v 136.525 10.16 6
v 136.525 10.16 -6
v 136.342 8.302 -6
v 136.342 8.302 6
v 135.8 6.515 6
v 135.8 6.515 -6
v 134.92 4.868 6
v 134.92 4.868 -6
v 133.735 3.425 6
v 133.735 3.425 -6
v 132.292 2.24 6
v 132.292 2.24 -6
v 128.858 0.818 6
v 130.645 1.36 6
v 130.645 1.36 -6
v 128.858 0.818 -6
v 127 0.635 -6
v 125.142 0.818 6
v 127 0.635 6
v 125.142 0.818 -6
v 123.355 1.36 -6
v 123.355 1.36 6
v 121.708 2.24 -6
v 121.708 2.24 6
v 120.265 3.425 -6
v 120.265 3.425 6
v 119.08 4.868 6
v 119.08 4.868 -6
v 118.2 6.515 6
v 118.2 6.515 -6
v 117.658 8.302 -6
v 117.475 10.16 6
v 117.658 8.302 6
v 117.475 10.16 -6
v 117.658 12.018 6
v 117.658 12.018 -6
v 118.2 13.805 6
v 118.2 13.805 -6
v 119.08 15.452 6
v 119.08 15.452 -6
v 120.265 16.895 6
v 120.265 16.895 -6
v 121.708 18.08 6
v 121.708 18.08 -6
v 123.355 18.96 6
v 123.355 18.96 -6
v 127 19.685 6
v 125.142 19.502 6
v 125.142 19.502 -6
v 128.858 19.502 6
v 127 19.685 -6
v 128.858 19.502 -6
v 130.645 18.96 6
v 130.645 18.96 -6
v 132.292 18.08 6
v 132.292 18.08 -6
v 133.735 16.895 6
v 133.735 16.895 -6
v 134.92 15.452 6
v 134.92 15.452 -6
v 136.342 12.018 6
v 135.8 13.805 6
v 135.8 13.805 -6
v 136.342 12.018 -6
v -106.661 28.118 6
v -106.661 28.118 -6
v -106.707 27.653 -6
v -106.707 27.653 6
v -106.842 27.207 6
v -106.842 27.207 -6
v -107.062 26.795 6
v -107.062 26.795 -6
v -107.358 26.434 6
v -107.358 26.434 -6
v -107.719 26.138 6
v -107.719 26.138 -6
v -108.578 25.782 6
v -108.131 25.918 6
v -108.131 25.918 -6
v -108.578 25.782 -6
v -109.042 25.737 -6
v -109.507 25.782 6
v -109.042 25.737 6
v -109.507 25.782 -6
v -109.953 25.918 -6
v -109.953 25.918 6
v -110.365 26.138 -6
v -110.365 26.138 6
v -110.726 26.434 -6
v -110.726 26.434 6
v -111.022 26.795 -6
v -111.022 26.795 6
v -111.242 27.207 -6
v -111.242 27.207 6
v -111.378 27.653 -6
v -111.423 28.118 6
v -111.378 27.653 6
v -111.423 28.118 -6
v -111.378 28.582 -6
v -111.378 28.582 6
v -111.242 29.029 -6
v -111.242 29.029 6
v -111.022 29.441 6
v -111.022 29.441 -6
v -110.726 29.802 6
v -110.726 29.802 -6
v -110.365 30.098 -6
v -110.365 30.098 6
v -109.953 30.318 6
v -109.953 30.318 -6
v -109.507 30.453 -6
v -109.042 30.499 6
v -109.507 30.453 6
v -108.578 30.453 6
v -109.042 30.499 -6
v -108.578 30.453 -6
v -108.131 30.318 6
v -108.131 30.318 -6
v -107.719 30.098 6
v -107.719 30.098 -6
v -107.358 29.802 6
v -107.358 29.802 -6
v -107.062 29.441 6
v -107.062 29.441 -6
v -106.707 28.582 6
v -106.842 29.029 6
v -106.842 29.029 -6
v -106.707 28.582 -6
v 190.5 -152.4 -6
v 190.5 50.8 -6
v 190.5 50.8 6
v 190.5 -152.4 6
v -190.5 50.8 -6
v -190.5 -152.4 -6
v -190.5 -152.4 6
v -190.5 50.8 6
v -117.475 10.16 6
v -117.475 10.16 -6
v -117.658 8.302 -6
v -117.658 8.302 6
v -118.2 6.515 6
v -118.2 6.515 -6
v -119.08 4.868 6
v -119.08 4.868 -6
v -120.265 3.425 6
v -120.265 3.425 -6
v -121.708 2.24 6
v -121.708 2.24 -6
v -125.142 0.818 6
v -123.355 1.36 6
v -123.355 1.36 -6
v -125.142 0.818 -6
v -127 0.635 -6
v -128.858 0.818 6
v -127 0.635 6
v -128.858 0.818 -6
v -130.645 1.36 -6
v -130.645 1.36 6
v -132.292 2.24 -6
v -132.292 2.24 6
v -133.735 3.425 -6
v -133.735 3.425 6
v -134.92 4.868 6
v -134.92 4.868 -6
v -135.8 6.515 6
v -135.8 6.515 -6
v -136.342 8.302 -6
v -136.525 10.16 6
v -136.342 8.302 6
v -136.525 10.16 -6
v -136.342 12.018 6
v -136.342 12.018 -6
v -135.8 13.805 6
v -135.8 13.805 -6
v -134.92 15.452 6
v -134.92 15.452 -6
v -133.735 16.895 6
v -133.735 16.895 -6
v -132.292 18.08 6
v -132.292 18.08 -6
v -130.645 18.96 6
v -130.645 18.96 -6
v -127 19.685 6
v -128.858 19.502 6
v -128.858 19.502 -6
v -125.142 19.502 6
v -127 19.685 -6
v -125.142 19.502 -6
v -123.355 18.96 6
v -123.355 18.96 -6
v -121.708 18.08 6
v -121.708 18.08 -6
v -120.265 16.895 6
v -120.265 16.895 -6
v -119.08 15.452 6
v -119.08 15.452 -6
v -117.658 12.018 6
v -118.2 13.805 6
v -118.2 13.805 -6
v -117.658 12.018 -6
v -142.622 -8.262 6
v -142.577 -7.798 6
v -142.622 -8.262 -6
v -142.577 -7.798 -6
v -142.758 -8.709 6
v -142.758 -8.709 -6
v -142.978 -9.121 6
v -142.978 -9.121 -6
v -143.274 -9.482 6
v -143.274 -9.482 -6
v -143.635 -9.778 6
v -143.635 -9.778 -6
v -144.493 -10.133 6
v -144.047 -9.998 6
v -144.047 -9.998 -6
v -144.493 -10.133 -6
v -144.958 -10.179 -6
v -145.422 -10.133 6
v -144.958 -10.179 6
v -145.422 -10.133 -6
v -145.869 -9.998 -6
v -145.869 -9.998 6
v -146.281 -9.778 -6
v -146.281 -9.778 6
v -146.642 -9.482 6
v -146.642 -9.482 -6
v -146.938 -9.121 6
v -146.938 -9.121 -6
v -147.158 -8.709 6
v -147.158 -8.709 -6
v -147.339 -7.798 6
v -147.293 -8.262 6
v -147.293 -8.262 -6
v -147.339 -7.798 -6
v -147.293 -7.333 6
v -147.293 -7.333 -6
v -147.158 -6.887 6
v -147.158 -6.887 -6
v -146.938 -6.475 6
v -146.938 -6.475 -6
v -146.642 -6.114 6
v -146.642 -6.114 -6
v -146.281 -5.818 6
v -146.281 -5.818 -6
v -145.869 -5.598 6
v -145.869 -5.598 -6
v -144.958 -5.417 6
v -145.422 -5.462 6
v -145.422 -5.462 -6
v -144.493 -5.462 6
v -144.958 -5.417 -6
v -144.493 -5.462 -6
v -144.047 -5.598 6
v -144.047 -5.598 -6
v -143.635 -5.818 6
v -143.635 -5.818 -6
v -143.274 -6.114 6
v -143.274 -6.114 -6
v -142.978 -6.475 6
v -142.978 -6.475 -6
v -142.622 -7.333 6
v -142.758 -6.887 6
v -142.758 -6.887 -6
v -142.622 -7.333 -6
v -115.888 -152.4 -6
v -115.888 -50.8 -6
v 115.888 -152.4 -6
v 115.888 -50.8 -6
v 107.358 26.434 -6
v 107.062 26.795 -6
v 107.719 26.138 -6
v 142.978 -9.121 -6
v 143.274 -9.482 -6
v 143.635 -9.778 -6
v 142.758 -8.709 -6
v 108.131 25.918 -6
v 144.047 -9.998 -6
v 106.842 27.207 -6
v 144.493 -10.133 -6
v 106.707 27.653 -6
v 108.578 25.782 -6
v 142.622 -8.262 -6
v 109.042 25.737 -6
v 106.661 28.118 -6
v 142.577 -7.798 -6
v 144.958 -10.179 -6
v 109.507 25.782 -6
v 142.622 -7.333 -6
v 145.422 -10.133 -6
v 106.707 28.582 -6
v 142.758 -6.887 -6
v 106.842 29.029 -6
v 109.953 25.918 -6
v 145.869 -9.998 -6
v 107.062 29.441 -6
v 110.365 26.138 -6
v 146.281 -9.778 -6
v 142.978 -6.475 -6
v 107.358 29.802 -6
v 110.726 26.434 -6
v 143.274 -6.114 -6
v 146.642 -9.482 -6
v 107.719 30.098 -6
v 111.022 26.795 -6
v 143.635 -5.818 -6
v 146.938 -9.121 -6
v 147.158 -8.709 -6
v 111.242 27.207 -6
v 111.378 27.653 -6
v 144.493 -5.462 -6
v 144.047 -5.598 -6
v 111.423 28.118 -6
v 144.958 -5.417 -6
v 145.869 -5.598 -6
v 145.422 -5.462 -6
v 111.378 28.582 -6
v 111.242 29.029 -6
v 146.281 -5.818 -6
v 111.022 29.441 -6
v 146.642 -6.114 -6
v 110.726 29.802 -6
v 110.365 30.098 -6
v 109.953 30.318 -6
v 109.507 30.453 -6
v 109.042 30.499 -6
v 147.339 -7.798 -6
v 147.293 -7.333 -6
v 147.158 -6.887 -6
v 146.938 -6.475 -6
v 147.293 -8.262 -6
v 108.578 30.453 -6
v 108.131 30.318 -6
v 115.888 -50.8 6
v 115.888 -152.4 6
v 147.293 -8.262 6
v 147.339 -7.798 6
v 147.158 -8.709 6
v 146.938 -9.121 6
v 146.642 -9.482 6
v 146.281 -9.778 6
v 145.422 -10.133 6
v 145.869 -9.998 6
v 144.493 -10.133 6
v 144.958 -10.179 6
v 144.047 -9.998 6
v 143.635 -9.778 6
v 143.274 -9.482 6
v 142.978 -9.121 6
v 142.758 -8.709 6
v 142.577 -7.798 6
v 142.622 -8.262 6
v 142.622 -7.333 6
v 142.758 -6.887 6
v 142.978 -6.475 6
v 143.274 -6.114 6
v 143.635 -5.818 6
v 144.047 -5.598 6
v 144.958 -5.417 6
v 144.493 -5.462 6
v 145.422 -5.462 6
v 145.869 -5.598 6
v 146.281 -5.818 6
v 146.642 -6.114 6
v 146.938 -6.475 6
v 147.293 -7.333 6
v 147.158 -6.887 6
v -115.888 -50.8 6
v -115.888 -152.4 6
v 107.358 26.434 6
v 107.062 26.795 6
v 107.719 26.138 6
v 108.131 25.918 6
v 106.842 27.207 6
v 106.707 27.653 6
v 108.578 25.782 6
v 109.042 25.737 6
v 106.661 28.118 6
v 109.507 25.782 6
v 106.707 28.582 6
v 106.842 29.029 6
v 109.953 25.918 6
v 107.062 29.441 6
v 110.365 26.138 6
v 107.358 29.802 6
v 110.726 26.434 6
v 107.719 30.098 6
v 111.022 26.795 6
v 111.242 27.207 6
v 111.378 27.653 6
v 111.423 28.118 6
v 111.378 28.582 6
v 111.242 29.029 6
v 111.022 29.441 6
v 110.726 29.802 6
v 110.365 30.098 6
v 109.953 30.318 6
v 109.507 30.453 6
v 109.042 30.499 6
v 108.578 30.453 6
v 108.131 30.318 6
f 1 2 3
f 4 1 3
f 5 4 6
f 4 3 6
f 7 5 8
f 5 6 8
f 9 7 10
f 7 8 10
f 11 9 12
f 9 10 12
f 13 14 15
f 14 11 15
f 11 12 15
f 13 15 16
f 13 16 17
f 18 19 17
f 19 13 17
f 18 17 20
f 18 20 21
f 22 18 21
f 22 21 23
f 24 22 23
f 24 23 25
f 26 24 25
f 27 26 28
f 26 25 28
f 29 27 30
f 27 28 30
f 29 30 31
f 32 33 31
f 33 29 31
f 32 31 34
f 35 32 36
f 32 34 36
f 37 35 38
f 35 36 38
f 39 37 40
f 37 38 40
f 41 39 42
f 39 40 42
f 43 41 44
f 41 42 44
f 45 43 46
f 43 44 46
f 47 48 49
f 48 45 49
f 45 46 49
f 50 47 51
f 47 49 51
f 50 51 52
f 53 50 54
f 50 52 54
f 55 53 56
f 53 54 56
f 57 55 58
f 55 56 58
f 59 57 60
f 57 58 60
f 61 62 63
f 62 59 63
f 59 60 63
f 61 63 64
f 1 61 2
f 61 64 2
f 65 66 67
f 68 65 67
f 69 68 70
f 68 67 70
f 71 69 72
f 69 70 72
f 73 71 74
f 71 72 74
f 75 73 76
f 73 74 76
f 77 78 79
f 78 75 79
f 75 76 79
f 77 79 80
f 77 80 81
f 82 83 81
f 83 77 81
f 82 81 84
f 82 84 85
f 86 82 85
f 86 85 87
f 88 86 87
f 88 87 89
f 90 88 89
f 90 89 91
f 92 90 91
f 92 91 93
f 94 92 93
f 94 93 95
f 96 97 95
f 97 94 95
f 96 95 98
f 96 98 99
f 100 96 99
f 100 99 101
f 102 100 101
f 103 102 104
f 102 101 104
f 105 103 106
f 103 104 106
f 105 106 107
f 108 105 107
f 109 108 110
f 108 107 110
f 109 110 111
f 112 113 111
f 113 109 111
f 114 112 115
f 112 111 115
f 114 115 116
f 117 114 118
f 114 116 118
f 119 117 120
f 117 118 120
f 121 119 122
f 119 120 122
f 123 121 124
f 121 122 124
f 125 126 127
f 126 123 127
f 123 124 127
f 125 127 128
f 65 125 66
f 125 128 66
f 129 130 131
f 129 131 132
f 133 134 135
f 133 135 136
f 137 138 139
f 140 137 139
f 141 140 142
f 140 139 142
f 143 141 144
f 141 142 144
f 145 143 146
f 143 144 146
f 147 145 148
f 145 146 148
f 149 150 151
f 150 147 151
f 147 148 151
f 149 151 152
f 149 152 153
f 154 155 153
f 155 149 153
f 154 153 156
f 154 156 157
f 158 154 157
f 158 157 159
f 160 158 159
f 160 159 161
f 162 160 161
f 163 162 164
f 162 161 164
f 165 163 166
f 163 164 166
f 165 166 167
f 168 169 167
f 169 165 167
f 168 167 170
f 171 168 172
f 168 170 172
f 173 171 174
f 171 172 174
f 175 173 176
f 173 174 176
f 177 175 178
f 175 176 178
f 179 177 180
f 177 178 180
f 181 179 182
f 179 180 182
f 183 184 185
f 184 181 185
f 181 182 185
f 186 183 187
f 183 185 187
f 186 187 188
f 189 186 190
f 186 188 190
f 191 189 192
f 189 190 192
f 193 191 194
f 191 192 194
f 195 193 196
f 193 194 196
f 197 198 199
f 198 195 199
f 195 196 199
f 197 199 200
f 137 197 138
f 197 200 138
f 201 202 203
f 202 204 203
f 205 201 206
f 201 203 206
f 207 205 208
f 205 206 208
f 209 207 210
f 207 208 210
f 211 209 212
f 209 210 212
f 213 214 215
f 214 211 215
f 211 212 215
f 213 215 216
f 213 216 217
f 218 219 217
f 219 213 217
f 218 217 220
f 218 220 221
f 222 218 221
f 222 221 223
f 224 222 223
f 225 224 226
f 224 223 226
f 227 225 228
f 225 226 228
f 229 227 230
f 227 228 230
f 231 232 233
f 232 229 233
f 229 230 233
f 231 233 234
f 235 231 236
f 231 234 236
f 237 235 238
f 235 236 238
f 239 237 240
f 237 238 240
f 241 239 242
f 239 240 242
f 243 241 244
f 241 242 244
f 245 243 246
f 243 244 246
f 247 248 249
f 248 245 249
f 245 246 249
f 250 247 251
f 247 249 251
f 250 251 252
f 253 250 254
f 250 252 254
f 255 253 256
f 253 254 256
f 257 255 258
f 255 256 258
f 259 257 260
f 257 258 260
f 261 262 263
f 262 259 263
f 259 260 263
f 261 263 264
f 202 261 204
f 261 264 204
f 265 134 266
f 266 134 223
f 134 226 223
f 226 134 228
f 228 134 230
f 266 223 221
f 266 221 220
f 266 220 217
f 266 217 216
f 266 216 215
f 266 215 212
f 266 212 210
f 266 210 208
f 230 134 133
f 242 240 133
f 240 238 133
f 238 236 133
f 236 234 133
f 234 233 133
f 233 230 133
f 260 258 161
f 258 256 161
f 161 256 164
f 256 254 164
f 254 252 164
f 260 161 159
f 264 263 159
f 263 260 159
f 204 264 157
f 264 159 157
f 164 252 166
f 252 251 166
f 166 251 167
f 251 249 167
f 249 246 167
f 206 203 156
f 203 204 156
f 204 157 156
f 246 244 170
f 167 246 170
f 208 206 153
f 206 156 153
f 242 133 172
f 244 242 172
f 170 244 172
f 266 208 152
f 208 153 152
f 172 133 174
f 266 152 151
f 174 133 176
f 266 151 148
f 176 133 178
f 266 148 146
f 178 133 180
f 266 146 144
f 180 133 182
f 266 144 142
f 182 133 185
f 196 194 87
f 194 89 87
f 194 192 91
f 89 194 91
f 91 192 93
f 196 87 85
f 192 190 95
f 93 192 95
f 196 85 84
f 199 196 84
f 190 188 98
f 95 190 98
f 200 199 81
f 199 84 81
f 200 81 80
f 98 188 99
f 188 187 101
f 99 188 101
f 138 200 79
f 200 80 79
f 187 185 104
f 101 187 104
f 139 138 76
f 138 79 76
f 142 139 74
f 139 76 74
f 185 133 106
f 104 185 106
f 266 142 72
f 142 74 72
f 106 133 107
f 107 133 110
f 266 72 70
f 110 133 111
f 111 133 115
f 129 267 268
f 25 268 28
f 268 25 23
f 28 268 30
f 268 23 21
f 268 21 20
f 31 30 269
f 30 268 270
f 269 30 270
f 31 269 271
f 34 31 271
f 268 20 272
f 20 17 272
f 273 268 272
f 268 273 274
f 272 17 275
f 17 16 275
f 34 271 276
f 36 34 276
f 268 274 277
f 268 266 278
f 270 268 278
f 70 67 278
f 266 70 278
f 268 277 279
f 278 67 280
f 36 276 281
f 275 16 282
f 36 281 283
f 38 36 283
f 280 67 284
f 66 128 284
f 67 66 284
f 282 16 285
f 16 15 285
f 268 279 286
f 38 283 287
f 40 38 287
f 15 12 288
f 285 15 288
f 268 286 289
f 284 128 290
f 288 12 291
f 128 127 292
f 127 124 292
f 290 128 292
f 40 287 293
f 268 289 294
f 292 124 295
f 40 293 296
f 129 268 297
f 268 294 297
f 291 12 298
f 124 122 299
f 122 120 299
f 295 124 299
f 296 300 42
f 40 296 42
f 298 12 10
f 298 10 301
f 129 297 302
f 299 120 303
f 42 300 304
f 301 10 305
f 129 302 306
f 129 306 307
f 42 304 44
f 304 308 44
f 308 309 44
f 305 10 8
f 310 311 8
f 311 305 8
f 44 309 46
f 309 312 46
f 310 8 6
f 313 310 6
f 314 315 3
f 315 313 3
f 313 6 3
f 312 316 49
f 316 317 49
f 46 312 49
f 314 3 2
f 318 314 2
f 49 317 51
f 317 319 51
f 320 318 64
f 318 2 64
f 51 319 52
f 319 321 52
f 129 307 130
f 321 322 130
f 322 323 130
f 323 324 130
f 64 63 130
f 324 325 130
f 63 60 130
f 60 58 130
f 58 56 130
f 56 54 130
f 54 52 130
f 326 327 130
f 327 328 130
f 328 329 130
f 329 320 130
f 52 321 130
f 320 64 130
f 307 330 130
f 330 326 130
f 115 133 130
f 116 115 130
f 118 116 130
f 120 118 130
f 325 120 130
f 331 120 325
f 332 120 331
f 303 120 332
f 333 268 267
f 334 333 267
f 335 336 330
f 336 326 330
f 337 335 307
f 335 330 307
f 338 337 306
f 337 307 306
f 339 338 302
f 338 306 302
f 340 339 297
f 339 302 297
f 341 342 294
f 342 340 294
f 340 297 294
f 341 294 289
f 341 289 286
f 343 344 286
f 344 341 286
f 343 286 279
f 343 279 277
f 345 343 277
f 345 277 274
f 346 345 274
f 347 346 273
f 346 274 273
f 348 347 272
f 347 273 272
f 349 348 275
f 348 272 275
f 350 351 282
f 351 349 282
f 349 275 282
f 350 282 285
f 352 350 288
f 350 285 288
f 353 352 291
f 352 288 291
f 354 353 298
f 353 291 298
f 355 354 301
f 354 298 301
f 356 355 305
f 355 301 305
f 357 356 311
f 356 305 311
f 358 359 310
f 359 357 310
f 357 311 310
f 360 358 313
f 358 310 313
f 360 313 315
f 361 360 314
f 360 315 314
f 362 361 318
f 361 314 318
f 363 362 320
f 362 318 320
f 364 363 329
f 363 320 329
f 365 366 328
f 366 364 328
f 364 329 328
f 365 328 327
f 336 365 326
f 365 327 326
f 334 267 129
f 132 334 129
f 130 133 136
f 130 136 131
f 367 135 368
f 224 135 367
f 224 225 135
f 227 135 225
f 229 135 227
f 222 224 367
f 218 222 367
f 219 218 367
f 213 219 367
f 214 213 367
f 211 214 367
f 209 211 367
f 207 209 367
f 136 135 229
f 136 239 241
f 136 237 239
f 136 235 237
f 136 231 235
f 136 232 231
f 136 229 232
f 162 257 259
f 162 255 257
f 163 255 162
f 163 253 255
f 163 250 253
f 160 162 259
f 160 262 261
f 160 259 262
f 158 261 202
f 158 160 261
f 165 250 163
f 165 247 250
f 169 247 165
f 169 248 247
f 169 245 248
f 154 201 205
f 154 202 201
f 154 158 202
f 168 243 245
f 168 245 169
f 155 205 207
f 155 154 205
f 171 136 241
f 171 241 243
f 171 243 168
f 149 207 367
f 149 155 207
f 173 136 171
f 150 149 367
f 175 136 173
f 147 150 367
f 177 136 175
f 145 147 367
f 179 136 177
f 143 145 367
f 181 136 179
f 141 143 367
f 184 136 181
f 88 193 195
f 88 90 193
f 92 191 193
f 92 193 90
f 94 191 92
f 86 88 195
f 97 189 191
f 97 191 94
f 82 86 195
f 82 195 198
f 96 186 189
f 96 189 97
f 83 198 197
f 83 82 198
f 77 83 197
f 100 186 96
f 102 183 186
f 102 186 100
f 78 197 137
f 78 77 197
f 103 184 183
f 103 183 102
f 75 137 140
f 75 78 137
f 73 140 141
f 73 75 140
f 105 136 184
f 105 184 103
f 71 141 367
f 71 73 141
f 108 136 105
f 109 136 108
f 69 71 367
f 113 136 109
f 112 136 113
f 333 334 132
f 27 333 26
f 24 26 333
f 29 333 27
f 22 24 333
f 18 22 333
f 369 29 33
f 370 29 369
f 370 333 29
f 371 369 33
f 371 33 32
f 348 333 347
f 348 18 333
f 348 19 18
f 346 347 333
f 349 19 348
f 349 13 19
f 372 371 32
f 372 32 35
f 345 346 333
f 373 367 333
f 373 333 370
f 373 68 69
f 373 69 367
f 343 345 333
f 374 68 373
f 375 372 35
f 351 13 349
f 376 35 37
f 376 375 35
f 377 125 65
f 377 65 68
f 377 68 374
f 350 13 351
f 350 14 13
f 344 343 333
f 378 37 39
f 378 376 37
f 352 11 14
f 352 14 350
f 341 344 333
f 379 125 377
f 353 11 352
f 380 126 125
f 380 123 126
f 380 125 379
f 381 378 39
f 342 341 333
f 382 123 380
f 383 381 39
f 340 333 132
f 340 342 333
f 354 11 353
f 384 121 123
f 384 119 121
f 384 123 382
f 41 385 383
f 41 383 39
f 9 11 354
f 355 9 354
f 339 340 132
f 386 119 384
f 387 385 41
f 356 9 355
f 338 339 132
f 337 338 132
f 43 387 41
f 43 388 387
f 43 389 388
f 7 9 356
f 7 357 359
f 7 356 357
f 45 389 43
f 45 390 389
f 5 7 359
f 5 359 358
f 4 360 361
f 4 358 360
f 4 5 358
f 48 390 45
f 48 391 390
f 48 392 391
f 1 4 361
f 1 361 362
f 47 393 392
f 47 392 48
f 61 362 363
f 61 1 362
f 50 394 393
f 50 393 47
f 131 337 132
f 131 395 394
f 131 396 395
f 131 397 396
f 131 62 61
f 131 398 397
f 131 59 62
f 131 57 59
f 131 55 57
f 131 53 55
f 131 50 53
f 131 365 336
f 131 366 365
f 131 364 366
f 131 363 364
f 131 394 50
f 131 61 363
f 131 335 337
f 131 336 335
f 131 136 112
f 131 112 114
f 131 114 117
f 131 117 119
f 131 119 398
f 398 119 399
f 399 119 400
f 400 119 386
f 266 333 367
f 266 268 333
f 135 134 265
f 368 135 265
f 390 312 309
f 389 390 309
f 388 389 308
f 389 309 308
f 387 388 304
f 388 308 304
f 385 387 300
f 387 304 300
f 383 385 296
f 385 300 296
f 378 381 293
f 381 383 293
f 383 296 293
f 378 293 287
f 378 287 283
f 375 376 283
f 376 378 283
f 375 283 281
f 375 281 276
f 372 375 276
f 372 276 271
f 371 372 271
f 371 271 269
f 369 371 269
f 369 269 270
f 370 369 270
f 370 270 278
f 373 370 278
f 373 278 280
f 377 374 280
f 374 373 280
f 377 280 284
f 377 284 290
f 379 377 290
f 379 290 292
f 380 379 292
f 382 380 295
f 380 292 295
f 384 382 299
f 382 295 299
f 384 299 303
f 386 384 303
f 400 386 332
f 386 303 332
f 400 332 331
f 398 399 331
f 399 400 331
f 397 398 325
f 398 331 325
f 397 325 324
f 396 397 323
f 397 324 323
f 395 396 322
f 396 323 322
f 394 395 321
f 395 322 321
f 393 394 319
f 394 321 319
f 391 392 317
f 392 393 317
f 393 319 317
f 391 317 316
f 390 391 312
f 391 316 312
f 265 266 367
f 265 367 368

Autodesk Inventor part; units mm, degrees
ref_plane "YZ Plane" through (0, 0, 0) normal (1, 0, 0) x (0, 1, 0)
ref_plane "XZ Plane" through (0, 0, 0) normal (0, 1, 0) x (-1, 0, 0)
ref_plane "XY Plane" through (0, 0, 0) normal (0, 0, 1) x (1, 0, 0)
sketch "Sketch1" plane through (0, 0, 0) normal (0, 0, 1) x (1, 0, 0)
  line L0 (-190.5, 50.8) -> (190.5, 50.8)
  line L1 (190.5, 50.8) -> (190.5, -50.8)
  line L2 (115.8875, -50.8) -> (-115.8875, -50.8)
  line L3 (-190.5, -50.8) -> (-190.5, 50.8)
  line L4 (-190.5, 50.8) -> (190.5, -50.8) construction
  line L5 (190.5, 50.8) -> (-190.5, -50.8) construction
  circle A0 centre (-127, 10.16) radius 9.525
  circle A1 centre (-109.0422, 28.1178) radius 2.3812
  circle A2 centre (-144.9578, -7.7978) radius 2.3812
  line L6 (0, 0) -> (0, 83.7438) construction
  circle A3 centre (127, 10.16) radius 9.525
  circle A4 centre (109.0422, 28.1178) radius 2.3812
  circle A5 centre (144.9578, -7.7978) radius 2.3812
  line L7 (115.8875, -50.8) -> (115.8875, -152.4)
  line L8 (-190.5, -50.8) -> (-190.5, -152.4)
  line L9 (190.5, -50.8) -> (190.5, -152.4)
  line L10 (-190.5, -152.4) -> (-115.8875, -152.4)
  line L11 (115.8875, -152.4) -> (190.5, -152.4)
  line L12 (-115.8875, -27.9247) -> (-115.8875, -30.9033)
  line L13 (-115.8875, -50.8) -> (-115.8875, -152.4)
  dimension "d0" = 381
  dimension "d1" = 101.6
  dimension "d2" = 19.05
  dimension "d4" = 127
  dimension "d5" = 60.96
  dimension "d6" = 4.7625
  dimension "d8" = 17.9578
  dimension "d9" = 17.9578
  dimension "d10" = 4.7625
  dimension "d11" = 17.9578
  dimension "d12" = 17.9578
  dimension "d15" = 115.8875
extrude "Extrusion1" add sketch "Sketch1" along normal mid plane 11.999
properties part number "Indexer Upper Plate"
